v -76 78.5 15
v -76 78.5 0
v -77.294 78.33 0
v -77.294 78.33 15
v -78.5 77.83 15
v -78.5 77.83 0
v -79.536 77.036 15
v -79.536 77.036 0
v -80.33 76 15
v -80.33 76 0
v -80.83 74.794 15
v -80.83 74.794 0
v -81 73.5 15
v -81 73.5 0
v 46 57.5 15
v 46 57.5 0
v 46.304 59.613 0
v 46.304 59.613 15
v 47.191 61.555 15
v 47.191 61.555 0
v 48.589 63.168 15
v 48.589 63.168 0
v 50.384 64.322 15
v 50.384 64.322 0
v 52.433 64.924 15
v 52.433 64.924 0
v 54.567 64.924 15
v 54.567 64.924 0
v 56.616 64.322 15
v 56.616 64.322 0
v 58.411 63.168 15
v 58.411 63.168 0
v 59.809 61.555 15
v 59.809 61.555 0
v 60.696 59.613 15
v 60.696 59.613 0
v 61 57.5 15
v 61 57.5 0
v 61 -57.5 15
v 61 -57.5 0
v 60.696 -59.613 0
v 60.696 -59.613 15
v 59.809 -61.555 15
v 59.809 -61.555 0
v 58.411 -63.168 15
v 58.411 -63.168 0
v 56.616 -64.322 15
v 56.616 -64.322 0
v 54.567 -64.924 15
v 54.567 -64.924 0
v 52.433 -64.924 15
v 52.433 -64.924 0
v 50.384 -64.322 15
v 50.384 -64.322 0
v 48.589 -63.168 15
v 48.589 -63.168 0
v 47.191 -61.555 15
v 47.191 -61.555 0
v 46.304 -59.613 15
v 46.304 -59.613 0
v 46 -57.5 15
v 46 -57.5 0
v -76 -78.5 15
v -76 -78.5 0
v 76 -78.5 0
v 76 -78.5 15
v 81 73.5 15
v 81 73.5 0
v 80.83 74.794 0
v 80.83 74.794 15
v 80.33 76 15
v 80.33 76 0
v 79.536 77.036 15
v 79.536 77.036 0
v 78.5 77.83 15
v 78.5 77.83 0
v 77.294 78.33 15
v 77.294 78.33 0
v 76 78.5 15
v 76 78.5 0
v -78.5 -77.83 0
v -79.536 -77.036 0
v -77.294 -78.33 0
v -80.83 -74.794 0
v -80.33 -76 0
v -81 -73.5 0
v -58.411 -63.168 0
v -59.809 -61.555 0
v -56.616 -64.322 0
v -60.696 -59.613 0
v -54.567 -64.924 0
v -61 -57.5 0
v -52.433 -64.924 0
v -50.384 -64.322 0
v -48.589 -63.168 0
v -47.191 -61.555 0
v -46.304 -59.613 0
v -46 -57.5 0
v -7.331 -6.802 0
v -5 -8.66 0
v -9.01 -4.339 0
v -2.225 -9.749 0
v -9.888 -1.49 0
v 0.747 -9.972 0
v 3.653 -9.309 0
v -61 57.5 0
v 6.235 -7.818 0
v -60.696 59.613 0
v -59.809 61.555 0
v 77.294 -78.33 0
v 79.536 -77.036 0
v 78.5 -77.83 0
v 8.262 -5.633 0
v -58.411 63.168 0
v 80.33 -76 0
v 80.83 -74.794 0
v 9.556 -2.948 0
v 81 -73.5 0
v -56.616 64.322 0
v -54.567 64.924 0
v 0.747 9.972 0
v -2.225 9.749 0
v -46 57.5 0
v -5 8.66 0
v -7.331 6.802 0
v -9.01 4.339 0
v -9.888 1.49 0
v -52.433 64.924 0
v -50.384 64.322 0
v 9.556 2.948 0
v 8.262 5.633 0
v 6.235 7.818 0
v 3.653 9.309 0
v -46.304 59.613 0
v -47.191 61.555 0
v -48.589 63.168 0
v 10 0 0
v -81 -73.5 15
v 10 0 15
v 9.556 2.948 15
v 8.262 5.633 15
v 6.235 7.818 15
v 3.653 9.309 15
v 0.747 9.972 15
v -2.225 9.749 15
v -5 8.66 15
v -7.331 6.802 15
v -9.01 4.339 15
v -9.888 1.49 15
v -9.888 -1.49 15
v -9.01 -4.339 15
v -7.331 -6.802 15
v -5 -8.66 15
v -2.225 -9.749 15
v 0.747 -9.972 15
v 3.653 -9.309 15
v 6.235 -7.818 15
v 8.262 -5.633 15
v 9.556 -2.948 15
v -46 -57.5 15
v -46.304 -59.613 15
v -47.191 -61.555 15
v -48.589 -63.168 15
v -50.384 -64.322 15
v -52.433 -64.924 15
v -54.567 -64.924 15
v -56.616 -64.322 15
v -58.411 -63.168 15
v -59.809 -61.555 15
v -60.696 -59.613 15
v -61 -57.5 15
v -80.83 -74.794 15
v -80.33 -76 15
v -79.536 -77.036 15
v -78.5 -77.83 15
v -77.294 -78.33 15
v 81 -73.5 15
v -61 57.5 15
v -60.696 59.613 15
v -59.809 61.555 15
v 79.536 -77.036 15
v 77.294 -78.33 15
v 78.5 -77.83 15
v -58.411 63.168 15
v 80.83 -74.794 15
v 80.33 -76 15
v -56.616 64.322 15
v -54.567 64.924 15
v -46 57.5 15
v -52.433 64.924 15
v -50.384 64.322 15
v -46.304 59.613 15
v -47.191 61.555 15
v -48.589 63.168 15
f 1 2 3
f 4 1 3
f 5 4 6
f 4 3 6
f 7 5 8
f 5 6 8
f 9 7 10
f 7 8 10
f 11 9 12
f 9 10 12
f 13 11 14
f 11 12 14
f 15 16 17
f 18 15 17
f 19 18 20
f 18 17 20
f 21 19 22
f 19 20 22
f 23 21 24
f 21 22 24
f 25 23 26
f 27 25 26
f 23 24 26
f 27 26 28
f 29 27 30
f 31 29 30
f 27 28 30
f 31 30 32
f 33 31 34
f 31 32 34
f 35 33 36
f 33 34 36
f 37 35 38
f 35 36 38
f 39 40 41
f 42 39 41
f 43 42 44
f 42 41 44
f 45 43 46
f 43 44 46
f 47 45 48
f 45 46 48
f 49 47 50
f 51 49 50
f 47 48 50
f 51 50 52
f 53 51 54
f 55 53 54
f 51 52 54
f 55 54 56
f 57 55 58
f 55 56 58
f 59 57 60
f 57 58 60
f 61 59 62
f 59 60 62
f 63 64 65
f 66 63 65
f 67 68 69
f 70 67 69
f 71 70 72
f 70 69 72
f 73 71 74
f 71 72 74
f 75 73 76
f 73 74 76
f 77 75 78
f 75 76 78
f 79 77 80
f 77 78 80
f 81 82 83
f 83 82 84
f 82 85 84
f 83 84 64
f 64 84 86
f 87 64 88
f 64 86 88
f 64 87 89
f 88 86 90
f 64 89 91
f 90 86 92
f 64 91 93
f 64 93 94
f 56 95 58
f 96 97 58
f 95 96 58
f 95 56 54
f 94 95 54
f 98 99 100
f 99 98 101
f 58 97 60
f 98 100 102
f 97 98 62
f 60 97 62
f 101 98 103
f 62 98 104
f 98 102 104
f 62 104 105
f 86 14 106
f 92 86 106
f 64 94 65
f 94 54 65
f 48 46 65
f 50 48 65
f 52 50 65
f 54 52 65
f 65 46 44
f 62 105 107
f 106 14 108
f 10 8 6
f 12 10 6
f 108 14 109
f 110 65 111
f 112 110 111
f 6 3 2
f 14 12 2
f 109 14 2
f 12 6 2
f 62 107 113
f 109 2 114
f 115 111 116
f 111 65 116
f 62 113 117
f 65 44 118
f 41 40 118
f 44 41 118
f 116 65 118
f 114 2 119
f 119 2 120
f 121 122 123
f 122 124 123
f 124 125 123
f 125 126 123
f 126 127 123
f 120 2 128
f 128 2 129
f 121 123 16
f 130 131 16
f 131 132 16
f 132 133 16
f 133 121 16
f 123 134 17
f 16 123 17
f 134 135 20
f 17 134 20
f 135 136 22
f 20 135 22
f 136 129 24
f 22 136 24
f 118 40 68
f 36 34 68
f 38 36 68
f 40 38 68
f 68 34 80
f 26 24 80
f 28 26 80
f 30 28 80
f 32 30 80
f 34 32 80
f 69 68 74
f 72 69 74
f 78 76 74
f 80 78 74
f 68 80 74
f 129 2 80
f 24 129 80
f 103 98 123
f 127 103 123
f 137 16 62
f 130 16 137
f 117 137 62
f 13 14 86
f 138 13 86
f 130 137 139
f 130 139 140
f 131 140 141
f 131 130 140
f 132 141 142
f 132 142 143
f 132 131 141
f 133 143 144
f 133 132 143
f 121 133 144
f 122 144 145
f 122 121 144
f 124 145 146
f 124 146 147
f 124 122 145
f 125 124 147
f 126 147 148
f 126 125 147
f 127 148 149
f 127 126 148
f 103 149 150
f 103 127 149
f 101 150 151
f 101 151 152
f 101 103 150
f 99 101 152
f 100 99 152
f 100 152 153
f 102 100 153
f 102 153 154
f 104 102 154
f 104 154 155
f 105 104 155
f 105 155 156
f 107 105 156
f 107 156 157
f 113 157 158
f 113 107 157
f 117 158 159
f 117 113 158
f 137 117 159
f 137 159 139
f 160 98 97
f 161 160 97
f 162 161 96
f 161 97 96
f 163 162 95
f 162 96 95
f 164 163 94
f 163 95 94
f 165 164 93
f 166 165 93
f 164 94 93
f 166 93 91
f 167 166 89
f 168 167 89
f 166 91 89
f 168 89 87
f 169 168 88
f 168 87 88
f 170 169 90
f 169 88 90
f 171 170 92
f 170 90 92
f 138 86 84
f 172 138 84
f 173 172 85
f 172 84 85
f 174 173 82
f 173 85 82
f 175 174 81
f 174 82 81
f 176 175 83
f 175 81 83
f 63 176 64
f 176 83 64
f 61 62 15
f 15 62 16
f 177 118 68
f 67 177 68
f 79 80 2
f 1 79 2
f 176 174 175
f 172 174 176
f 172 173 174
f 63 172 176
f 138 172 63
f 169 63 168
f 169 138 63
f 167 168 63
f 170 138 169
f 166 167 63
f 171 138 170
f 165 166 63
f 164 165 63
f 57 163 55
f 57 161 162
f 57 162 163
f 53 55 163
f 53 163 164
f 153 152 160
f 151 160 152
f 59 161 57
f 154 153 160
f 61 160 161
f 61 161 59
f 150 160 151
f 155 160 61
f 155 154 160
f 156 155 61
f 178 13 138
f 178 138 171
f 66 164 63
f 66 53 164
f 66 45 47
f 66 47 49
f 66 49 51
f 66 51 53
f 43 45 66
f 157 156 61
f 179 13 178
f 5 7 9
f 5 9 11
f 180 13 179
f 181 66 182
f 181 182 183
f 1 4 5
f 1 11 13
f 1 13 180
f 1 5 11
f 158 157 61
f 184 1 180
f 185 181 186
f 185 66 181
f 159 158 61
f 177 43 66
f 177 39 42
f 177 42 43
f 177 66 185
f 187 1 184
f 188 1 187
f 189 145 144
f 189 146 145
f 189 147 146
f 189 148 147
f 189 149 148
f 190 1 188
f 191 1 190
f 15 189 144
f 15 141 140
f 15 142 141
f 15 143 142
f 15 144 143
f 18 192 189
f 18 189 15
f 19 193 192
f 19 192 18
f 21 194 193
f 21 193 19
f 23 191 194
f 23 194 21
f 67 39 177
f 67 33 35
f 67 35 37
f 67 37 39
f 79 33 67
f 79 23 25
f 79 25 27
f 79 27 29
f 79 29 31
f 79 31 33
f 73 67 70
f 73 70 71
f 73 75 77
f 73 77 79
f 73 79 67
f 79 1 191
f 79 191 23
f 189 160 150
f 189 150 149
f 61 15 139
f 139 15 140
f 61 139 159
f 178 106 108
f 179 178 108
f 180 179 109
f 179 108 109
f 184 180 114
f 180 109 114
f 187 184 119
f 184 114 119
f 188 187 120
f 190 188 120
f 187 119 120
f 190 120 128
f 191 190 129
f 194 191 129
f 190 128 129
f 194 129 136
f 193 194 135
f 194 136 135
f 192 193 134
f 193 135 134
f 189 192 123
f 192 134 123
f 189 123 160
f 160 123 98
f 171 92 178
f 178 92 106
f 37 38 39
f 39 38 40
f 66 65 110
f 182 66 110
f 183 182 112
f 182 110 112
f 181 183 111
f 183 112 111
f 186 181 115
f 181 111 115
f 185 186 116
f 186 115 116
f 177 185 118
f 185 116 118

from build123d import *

# Parameters (mm, degrees)
F0_R     = 10
F1_DEPTH = 15


with BuildPart() as f1:
    # F0 (on Top) → F1 (new body)
    with BuildSketch(Plane.XY):
        with BuildLine():
            Line((76, 78.5), (-76, 78.5))
            ThreePointArc((-76, 78.5), (-79.535534, 77.035534), (-81, 73.5))
            Line((-81, 73.5), (-81, -73.5))
            ThreePointArc((-81, -73.5), (-79.535534, -77.035534), (-76, -78.5))
            Line((-76, -78.5), (76, -78.5))
            ThreePointArc((76, -78.5), (79.535534, -77.035534), (81, -73.5))
            Line((81, -73.5), (81, 73.5))
            ThreePointArc((81, 73.5), (79.535534, 77.035534), (76, 78.5))
        make_face()
        with BuildLine():
            ThreePointArc((-61, 57.5), (-53.5, 65), (-46, 57.5))
            Line((-46, 57.5), (-46, 0))
            Line((-46, 0), (-46, -57.5))
            ThreePointArc((-46, -57.5), (-53.5, -65), (-61, -57.5))
            Line((-61, -57.5), (-61, 0))
            Line((-61, 0), (-61, 57.5))
        make_face(mode=Mode.SUBTRACT)
        Circle(F0_R, mode=Mode.SUBTRACT)
        with BuildLine():
            Line((46, 0), (46, 57.5))
            ThreePointArc((46, 57.5), (53.5, 65), (61, 57.5))
            Line((61, 57.5), (61, 0))
            Line((61, 0), (61, -57.5))
            ThreePointArc((61, -57.5), (53.5, -65), (46, -57.5))
            Line((46, -57.5), (46, 0))
        make_face(mode=Mode.SUBTRACT)
    extrude(amount=F1_DEPTH)


solid = f1.part
